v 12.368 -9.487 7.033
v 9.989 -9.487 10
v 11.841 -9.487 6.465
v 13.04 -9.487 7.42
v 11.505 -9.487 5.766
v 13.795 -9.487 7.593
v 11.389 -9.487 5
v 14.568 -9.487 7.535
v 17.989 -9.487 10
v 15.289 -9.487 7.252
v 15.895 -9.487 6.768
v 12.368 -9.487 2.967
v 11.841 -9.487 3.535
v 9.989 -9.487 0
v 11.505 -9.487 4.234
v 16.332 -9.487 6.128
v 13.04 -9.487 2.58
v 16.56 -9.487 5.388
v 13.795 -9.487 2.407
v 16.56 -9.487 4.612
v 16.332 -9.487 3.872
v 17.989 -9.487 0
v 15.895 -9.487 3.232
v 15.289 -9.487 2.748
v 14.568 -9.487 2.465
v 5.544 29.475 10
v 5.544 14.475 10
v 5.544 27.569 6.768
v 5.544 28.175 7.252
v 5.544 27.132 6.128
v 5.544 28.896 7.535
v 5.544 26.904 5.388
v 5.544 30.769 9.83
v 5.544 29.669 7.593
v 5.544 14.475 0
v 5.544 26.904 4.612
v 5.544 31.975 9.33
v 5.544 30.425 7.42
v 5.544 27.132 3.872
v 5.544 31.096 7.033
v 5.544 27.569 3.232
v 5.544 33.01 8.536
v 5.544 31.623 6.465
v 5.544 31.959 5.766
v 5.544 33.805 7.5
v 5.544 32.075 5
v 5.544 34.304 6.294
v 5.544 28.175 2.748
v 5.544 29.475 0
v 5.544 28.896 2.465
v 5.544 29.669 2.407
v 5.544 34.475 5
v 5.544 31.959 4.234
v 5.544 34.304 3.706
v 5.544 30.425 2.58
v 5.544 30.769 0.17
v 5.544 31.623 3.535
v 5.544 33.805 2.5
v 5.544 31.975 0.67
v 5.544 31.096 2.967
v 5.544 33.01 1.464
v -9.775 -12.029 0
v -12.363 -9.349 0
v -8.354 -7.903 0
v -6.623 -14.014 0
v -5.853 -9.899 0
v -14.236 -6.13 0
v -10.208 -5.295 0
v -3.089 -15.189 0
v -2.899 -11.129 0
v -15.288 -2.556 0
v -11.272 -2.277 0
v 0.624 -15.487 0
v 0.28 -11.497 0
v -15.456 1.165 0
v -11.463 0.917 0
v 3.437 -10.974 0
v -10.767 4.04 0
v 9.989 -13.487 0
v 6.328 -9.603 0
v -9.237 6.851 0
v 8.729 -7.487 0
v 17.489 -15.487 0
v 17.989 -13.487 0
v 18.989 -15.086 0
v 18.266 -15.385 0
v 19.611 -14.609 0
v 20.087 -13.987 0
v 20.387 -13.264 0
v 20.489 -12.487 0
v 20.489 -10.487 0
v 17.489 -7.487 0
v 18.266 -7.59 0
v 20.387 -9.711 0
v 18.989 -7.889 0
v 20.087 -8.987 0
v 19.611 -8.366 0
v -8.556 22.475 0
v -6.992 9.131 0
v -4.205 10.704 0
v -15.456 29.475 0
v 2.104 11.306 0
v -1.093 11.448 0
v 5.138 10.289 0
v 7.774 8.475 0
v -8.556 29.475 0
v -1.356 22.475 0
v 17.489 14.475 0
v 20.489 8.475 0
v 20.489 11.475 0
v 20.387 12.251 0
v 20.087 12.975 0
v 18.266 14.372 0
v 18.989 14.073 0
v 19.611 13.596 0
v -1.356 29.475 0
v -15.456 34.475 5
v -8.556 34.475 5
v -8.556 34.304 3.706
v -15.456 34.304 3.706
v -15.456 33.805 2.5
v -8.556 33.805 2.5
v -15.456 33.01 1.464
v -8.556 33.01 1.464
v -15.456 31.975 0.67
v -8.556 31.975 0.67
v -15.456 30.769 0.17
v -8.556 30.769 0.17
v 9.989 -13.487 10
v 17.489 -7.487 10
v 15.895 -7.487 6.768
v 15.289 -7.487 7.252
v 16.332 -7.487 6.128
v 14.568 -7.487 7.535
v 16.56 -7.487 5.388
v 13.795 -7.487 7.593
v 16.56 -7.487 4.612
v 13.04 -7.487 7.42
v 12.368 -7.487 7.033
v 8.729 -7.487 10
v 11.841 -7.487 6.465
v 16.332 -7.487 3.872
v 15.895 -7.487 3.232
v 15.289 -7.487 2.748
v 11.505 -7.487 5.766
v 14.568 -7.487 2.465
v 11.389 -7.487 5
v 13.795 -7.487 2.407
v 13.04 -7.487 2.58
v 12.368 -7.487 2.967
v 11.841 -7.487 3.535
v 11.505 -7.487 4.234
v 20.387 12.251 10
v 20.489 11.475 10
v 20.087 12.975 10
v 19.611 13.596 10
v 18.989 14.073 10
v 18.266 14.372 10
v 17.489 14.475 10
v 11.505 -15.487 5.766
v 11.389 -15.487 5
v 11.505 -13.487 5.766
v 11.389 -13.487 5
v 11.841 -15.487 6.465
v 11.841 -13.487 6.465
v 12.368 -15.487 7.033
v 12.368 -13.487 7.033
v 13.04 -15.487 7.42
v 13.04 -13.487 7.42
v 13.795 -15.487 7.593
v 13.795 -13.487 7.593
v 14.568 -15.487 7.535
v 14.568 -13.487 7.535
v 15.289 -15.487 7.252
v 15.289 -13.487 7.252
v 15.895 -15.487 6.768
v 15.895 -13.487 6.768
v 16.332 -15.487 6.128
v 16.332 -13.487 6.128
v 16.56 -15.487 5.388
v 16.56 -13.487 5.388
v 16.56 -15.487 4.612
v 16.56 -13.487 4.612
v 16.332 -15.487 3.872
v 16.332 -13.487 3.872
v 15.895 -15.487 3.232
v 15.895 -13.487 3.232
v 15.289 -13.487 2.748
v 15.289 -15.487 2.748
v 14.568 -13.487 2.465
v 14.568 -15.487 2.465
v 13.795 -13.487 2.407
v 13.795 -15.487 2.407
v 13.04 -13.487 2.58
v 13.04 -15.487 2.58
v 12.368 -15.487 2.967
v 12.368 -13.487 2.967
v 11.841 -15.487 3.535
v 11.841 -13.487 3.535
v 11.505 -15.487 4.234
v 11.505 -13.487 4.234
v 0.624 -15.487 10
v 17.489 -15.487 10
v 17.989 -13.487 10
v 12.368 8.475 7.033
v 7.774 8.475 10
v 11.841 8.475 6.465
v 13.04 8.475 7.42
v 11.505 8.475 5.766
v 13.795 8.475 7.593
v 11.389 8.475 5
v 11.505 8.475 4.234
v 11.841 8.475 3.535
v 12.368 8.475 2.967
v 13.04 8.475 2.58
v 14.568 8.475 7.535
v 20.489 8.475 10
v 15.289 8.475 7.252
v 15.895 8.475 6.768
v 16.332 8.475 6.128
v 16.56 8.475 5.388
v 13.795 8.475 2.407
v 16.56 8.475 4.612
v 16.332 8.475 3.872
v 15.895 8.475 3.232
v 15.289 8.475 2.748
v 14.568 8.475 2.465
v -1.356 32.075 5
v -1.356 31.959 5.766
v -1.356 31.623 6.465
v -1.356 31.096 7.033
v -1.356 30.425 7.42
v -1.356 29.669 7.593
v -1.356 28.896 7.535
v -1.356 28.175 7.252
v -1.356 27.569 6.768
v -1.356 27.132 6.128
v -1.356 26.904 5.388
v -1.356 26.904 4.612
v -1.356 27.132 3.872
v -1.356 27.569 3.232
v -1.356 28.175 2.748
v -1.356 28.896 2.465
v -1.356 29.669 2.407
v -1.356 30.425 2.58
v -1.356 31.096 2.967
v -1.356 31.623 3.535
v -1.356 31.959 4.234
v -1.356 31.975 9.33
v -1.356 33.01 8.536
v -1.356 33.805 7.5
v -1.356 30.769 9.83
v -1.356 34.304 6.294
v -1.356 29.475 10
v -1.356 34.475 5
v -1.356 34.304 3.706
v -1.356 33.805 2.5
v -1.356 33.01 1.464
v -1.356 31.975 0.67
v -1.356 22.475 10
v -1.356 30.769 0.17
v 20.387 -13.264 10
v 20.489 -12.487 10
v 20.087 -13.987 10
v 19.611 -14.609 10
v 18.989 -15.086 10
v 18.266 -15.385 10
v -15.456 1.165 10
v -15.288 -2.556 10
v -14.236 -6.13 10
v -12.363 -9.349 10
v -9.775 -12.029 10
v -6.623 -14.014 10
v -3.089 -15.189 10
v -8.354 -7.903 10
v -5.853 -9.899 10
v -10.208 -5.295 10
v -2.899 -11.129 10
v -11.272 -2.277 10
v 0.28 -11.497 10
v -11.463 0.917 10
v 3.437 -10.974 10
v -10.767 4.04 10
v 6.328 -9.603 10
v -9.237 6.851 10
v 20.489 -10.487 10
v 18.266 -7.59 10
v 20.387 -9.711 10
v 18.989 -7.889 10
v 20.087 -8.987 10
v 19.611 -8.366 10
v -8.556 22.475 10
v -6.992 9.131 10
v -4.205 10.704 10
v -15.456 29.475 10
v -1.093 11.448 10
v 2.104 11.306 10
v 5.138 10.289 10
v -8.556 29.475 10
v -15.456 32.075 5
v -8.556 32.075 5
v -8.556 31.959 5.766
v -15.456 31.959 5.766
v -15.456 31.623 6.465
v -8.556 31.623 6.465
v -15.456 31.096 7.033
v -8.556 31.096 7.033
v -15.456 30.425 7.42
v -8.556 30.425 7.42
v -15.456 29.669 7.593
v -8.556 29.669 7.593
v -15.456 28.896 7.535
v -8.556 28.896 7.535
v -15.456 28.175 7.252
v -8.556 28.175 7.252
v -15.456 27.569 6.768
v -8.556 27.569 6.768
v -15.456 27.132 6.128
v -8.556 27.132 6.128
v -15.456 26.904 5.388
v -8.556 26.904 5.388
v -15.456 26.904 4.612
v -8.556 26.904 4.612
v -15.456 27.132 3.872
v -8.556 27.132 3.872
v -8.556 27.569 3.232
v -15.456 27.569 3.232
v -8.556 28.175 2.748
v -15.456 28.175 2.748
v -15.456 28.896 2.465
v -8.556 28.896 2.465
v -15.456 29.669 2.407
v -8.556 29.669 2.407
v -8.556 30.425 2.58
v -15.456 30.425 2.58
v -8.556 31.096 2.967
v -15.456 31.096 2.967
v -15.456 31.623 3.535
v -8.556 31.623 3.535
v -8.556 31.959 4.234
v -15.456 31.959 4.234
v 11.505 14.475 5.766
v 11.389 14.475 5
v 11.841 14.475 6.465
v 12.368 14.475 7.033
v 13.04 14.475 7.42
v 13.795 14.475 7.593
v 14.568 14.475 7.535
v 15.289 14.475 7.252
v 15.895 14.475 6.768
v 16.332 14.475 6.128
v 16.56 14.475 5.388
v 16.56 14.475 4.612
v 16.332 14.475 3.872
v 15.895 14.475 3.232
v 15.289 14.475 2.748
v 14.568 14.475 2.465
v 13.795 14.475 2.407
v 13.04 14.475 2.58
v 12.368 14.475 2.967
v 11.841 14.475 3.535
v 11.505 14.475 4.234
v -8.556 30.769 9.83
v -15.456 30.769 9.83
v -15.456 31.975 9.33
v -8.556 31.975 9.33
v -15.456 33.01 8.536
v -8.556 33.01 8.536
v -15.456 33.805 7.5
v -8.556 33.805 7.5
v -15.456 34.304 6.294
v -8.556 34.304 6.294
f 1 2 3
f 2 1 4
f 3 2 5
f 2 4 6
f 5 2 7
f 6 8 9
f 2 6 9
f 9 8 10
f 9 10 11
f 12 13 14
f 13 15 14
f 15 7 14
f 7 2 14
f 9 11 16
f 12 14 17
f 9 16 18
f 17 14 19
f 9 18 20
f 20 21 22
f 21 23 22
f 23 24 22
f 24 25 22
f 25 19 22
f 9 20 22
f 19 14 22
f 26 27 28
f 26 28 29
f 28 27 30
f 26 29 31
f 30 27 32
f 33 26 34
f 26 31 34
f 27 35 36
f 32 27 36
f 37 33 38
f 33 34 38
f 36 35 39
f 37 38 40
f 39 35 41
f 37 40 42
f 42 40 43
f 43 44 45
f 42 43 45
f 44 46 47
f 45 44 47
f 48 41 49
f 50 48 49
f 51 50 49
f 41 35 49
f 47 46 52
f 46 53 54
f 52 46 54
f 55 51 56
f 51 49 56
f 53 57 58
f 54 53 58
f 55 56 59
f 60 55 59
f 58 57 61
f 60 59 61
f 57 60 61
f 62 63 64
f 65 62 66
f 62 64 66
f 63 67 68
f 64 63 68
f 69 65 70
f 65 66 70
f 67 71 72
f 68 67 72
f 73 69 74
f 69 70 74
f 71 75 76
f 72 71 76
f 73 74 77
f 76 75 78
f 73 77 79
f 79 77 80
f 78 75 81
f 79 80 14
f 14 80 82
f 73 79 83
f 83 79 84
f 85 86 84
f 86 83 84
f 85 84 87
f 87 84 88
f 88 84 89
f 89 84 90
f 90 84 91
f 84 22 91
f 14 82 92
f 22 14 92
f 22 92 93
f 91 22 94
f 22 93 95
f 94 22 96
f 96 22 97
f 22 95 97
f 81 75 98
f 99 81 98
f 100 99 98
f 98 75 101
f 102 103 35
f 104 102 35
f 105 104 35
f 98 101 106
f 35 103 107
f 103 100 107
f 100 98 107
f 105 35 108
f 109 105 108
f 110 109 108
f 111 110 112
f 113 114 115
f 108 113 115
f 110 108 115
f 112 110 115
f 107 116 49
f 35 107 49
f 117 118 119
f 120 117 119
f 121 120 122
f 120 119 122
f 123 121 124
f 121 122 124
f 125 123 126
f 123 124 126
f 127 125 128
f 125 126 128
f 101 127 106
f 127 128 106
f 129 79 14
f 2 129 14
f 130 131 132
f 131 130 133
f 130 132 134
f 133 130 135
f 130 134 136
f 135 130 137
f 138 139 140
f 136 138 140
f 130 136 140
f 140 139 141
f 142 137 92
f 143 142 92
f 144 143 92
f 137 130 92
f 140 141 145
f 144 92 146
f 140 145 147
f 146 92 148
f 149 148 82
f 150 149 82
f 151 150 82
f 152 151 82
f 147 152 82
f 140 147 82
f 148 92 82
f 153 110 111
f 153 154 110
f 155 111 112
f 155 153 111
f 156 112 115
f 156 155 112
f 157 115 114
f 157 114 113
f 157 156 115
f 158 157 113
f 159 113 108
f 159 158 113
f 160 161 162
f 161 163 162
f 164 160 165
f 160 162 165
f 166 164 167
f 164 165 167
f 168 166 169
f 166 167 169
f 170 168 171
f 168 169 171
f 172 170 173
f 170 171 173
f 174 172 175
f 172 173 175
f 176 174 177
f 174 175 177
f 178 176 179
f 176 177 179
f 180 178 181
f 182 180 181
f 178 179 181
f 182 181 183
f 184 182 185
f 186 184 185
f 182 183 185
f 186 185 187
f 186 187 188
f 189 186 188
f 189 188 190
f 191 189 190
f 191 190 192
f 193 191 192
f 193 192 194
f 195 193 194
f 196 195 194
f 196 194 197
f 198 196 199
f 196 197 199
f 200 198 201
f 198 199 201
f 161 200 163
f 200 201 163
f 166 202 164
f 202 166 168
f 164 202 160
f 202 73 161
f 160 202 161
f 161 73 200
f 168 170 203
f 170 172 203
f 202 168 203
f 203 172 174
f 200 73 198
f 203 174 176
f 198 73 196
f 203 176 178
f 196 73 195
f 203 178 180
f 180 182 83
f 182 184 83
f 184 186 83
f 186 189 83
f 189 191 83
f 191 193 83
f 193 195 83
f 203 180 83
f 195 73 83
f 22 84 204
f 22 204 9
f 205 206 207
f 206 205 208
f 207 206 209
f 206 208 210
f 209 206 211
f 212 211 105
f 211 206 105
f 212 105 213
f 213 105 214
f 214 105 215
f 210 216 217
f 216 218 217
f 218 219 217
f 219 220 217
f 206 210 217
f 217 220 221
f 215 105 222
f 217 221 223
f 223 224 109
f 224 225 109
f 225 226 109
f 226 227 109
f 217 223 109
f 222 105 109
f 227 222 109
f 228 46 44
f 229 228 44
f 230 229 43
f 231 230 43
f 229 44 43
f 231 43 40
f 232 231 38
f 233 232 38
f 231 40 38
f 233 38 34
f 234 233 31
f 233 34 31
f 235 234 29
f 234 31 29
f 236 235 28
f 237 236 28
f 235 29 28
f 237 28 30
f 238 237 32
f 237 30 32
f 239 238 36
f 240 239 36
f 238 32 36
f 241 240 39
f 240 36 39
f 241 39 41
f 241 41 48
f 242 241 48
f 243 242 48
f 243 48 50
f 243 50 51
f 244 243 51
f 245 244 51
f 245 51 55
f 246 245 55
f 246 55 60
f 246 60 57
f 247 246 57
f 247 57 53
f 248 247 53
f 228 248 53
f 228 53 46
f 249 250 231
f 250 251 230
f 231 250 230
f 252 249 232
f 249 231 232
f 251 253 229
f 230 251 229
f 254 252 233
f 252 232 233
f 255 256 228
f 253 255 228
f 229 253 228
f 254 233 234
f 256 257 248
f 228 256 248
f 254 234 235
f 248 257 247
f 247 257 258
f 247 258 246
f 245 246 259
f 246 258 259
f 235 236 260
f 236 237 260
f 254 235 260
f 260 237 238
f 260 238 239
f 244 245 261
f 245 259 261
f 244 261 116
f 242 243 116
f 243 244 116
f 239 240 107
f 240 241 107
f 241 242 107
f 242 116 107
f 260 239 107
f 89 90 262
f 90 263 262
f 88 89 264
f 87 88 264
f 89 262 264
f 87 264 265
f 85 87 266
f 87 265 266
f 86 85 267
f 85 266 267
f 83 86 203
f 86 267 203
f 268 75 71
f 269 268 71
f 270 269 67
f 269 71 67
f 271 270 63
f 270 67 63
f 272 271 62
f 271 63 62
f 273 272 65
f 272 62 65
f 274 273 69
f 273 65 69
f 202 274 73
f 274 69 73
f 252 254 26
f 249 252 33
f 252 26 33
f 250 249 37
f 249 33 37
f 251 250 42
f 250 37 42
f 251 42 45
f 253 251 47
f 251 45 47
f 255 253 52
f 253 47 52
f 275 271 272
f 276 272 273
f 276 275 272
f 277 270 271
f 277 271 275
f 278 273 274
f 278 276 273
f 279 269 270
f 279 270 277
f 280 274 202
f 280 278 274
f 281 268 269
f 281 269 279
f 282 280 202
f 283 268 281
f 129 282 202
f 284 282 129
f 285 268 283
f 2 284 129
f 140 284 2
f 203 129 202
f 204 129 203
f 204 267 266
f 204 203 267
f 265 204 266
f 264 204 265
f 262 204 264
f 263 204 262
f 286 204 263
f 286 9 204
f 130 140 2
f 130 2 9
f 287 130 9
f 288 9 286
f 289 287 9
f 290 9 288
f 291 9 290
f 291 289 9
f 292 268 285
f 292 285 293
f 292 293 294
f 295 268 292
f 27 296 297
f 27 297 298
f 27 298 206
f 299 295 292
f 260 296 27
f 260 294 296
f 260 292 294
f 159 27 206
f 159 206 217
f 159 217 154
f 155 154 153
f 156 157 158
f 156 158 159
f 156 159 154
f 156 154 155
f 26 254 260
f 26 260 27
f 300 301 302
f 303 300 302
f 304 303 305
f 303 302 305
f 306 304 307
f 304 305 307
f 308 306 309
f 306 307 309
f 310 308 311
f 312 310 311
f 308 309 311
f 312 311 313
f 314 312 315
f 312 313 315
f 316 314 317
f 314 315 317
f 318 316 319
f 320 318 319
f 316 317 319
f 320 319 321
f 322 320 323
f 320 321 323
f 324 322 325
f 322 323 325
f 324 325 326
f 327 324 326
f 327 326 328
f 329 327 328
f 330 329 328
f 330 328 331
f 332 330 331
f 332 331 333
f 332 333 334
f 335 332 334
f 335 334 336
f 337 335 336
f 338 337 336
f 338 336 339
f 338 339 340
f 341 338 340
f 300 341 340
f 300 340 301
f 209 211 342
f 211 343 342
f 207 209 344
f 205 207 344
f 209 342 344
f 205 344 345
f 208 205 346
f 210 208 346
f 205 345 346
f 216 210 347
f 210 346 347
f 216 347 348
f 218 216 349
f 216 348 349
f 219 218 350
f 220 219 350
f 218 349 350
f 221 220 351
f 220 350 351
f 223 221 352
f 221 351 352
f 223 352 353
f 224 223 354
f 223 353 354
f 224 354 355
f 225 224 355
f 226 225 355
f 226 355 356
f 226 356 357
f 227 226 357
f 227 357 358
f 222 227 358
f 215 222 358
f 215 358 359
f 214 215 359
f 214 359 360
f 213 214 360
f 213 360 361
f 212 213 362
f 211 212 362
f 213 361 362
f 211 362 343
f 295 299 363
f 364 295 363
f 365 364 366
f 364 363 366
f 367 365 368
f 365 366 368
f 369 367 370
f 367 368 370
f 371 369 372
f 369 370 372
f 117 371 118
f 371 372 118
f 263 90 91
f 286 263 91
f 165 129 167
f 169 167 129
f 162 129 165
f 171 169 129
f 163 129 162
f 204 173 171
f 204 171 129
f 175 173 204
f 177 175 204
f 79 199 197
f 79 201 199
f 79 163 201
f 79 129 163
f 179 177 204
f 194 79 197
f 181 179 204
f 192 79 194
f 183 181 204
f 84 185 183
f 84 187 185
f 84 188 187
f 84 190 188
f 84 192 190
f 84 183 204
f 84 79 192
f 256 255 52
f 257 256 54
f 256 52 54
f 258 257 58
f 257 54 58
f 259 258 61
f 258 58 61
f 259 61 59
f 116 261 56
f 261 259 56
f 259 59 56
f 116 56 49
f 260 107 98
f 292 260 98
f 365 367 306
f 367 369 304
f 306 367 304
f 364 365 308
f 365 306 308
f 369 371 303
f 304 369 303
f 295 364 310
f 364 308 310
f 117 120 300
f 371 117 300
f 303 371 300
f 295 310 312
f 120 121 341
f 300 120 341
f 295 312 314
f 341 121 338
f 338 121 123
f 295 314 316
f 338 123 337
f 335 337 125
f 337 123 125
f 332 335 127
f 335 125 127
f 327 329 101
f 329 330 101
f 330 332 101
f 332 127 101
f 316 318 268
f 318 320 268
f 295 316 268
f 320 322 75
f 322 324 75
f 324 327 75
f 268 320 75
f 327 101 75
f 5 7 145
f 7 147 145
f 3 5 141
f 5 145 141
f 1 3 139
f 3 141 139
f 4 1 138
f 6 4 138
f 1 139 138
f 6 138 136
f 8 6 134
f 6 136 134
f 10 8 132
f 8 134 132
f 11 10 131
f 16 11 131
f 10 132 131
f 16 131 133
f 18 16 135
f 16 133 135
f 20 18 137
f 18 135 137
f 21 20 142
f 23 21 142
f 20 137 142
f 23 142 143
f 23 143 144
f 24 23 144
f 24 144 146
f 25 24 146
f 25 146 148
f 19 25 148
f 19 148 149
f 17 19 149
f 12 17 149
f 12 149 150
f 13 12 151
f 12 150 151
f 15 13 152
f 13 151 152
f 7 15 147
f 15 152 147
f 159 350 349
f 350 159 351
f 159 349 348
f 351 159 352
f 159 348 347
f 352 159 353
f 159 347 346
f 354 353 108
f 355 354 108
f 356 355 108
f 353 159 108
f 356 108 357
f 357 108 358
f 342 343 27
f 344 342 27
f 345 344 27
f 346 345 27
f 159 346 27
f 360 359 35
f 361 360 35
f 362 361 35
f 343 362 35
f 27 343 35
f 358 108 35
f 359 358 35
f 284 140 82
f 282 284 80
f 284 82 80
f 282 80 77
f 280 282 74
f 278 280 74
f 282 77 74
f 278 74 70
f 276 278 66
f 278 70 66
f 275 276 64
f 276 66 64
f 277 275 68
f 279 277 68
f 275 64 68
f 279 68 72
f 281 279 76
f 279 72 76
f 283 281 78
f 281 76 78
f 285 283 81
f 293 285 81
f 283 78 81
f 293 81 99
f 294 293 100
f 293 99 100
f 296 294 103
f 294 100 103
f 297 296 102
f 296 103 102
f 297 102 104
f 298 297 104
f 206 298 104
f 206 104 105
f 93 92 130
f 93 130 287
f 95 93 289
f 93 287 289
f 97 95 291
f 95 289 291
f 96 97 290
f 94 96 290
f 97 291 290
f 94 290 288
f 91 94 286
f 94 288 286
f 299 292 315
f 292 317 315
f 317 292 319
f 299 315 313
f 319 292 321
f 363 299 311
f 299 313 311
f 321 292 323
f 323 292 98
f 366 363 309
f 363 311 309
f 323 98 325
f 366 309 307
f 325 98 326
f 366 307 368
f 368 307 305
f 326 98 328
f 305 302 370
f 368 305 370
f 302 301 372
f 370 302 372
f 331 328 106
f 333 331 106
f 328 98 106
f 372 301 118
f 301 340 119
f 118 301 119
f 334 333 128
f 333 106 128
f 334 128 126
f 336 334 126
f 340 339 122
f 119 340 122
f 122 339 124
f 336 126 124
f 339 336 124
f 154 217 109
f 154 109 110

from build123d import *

# Parameters (mm, degrees)
F0_W     = 8
F0_H     = 4
F1_DEPTH = 10
F2_R     = 2.6
F3_DEPTH = 21
F4_R     = 2.6
F5_DEPTH = 50
F6_R     = 3


with BuildPart() as f1:
    # F0 (on Top) → F1 (new body)
    with BuildSketch(Plane.XY):
        with BuildLine():
            Line((20.489401, 8.474669), (20.489401, 14.474669))
            Line((20.489401, 14.474669), (5.543822, 14.474669))
            Line((5.543822, 14.474669), (5.543822, 34.474669))
            Line((5.543822, 34.474669), (-1.356178, 34.474669))
            Line((-1.356178, 34.474669), (-1.356178, 22.474669))
            Line((-1.356178, 22.474669), (-8.556178, 22.474669))
            Line((-8.556178, 22.474669), (-8.556178, 34.474669))
            Line((-8.556178, 34.474669), (-15.456178, 34.474669))
            Line((-15.456178, 34.474669), (-15.456178, 1.16472))
            ThreePointArc((-15.456178, 1.16472), (-11.149904, -10.767062), (0.624203, -15.487426))
            Line((0.624203, -15.487426), (11.585323, -15.487426))
            Line((11.585323, -15.487426), (20.489401, -15.487426))
            Line((20.489401, -15.487426), (20.489401, -7.487426))
            Line((20.489401, -7.487426), (8.728599, -7.487426))
            ThreePointArc((8.728599, -7.487426), (-11.479476, -0.686755), (7.773673, 8.474669))
            Line((7.773673, 8.474669), (20.489401, 8.474669))
        make_face()
        with Locations((13.989401, -11.487426)):
            Rectangle(F0_W, F0_H, mode=Mode.SUBTRACT)
    extrude(amount=F1_DEPTH)

    # F2 (on face) → F3 (cut, through all)
    with BuildSketch(Plane.YZ.offset(5.543822)):
        with BuildLine():
            ThreePointArc((34.474669, 5), (33.010203, 1.464466), (29.474669, 0))
            Line((29.474669, 0), (34.474669, 0))
            Line((34.474669, 0), (34.474669, 5))
        make_face()
        with BuildLine():
            ThreePointArc((29.474669, 10), (33.010203, 8.535534), (34.474669, 5))
            Line((34.474669, 5), (34.474669, 10))
            Line((34.474669, 10), (29.474669, 10))
        make_face()
        with Locations((29.474669, 5)):
            Circle(F2_R)
    extrude(amount=-F3_DEPTH, mode=Mode.SUBTRACT)

    # F4 (on face) → F5 (cut, symmetric)
    with BuildSketch(Plane(origin=(0, -13.487426, 0), x_dir=(-1, 0, 0), z_dir=(0, 1, 0))):
        with Locations((-13.989401, 5)):
            Circle(F4_R)
    extrude(amount=F5_DEPTH, both=True, mode=Mode.SUBTRACT)

    # F6
    f6_edges = [f1.edges().sort_by_distance(p)[0] for p in [
        (20.489401, 14.474669, 5),
        (20.489401, -7.487426, 5),
        (20.489401, -15.487426, 5),
    ]]
    fillet(f6_edges, radius=F6_R)


solid = f1.part
